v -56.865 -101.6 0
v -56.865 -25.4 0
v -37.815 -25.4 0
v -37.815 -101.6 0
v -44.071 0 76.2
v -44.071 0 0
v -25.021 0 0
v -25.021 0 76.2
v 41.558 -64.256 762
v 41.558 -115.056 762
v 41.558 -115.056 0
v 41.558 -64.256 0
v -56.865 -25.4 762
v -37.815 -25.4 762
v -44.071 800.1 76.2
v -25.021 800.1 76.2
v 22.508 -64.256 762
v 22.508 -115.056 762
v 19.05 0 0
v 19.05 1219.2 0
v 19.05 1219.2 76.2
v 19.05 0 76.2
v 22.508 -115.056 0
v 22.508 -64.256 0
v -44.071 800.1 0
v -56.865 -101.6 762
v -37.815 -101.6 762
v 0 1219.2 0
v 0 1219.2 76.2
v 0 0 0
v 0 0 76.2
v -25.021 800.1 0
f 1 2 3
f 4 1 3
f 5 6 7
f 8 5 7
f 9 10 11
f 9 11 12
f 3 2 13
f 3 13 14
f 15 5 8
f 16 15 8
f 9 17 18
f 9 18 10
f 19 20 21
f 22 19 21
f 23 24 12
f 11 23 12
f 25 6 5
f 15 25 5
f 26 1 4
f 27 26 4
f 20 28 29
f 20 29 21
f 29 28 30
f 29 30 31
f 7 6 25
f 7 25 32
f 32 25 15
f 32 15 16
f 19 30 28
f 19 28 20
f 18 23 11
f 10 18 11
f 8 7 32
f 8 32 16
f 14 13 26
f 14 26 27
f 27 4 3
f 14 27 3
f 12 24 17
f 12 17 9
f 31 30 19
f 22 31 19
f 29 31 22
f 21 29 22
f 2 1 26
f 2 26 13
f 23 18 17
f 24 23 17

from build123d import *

# Parameters (mm, degrees)
F0_W     = 19.05
F0_H     = 76.2
F1_DEPTH = 1219.2
F2_W     = 19.05
F2_H     = 76.2
F3_DEPTH = 800.1
F4_W     = 19.05
F4_H     = 76.2
F5_DEPTH = 762
F6_W     = 19.05
F6_H     = 50.8
F7_DEPTH = 762


with BuildPart() as f1:
    # F0 (on Front) → F1 (new body)
    with BuildSketch(Plane.XZ):
        with Locations((9.525, 38.1)):
            Rectangle(F0_W, F0_H)
    extrude(amount=-F1_DEPTH)


with BuildPart() as f3:
    # F2 (on Front) → F3 (new body)
    with BuildSketch(Plane.XZ):
        with Locations((-34.545891, 38.1)):
            Rectangle(F2_W, F2_H)
    extrude(amount=-F3_DEPTH)


with BuildPart() as f5:
    # F4 (on Top) → F5 (new body)
    with BuildSketch(Plane.XY):
        with Locations((-47.340003, -63.5)):
            Rectangle(F4_W, F4_H)
    extrude(amount=F5_DEPTH)


with BuildPart() as f7:
    # F6 (on Top) → F7 (new body)
    with BuildSketch(Plane.XY):
        with Locations((32.033181, -89.655731)):
            Rectangle(F6_W, F6_H)
    extrude(amount=F7_DEPTH)


solid = Compound([f1.part, f3.part, f5.part, f7.part])
